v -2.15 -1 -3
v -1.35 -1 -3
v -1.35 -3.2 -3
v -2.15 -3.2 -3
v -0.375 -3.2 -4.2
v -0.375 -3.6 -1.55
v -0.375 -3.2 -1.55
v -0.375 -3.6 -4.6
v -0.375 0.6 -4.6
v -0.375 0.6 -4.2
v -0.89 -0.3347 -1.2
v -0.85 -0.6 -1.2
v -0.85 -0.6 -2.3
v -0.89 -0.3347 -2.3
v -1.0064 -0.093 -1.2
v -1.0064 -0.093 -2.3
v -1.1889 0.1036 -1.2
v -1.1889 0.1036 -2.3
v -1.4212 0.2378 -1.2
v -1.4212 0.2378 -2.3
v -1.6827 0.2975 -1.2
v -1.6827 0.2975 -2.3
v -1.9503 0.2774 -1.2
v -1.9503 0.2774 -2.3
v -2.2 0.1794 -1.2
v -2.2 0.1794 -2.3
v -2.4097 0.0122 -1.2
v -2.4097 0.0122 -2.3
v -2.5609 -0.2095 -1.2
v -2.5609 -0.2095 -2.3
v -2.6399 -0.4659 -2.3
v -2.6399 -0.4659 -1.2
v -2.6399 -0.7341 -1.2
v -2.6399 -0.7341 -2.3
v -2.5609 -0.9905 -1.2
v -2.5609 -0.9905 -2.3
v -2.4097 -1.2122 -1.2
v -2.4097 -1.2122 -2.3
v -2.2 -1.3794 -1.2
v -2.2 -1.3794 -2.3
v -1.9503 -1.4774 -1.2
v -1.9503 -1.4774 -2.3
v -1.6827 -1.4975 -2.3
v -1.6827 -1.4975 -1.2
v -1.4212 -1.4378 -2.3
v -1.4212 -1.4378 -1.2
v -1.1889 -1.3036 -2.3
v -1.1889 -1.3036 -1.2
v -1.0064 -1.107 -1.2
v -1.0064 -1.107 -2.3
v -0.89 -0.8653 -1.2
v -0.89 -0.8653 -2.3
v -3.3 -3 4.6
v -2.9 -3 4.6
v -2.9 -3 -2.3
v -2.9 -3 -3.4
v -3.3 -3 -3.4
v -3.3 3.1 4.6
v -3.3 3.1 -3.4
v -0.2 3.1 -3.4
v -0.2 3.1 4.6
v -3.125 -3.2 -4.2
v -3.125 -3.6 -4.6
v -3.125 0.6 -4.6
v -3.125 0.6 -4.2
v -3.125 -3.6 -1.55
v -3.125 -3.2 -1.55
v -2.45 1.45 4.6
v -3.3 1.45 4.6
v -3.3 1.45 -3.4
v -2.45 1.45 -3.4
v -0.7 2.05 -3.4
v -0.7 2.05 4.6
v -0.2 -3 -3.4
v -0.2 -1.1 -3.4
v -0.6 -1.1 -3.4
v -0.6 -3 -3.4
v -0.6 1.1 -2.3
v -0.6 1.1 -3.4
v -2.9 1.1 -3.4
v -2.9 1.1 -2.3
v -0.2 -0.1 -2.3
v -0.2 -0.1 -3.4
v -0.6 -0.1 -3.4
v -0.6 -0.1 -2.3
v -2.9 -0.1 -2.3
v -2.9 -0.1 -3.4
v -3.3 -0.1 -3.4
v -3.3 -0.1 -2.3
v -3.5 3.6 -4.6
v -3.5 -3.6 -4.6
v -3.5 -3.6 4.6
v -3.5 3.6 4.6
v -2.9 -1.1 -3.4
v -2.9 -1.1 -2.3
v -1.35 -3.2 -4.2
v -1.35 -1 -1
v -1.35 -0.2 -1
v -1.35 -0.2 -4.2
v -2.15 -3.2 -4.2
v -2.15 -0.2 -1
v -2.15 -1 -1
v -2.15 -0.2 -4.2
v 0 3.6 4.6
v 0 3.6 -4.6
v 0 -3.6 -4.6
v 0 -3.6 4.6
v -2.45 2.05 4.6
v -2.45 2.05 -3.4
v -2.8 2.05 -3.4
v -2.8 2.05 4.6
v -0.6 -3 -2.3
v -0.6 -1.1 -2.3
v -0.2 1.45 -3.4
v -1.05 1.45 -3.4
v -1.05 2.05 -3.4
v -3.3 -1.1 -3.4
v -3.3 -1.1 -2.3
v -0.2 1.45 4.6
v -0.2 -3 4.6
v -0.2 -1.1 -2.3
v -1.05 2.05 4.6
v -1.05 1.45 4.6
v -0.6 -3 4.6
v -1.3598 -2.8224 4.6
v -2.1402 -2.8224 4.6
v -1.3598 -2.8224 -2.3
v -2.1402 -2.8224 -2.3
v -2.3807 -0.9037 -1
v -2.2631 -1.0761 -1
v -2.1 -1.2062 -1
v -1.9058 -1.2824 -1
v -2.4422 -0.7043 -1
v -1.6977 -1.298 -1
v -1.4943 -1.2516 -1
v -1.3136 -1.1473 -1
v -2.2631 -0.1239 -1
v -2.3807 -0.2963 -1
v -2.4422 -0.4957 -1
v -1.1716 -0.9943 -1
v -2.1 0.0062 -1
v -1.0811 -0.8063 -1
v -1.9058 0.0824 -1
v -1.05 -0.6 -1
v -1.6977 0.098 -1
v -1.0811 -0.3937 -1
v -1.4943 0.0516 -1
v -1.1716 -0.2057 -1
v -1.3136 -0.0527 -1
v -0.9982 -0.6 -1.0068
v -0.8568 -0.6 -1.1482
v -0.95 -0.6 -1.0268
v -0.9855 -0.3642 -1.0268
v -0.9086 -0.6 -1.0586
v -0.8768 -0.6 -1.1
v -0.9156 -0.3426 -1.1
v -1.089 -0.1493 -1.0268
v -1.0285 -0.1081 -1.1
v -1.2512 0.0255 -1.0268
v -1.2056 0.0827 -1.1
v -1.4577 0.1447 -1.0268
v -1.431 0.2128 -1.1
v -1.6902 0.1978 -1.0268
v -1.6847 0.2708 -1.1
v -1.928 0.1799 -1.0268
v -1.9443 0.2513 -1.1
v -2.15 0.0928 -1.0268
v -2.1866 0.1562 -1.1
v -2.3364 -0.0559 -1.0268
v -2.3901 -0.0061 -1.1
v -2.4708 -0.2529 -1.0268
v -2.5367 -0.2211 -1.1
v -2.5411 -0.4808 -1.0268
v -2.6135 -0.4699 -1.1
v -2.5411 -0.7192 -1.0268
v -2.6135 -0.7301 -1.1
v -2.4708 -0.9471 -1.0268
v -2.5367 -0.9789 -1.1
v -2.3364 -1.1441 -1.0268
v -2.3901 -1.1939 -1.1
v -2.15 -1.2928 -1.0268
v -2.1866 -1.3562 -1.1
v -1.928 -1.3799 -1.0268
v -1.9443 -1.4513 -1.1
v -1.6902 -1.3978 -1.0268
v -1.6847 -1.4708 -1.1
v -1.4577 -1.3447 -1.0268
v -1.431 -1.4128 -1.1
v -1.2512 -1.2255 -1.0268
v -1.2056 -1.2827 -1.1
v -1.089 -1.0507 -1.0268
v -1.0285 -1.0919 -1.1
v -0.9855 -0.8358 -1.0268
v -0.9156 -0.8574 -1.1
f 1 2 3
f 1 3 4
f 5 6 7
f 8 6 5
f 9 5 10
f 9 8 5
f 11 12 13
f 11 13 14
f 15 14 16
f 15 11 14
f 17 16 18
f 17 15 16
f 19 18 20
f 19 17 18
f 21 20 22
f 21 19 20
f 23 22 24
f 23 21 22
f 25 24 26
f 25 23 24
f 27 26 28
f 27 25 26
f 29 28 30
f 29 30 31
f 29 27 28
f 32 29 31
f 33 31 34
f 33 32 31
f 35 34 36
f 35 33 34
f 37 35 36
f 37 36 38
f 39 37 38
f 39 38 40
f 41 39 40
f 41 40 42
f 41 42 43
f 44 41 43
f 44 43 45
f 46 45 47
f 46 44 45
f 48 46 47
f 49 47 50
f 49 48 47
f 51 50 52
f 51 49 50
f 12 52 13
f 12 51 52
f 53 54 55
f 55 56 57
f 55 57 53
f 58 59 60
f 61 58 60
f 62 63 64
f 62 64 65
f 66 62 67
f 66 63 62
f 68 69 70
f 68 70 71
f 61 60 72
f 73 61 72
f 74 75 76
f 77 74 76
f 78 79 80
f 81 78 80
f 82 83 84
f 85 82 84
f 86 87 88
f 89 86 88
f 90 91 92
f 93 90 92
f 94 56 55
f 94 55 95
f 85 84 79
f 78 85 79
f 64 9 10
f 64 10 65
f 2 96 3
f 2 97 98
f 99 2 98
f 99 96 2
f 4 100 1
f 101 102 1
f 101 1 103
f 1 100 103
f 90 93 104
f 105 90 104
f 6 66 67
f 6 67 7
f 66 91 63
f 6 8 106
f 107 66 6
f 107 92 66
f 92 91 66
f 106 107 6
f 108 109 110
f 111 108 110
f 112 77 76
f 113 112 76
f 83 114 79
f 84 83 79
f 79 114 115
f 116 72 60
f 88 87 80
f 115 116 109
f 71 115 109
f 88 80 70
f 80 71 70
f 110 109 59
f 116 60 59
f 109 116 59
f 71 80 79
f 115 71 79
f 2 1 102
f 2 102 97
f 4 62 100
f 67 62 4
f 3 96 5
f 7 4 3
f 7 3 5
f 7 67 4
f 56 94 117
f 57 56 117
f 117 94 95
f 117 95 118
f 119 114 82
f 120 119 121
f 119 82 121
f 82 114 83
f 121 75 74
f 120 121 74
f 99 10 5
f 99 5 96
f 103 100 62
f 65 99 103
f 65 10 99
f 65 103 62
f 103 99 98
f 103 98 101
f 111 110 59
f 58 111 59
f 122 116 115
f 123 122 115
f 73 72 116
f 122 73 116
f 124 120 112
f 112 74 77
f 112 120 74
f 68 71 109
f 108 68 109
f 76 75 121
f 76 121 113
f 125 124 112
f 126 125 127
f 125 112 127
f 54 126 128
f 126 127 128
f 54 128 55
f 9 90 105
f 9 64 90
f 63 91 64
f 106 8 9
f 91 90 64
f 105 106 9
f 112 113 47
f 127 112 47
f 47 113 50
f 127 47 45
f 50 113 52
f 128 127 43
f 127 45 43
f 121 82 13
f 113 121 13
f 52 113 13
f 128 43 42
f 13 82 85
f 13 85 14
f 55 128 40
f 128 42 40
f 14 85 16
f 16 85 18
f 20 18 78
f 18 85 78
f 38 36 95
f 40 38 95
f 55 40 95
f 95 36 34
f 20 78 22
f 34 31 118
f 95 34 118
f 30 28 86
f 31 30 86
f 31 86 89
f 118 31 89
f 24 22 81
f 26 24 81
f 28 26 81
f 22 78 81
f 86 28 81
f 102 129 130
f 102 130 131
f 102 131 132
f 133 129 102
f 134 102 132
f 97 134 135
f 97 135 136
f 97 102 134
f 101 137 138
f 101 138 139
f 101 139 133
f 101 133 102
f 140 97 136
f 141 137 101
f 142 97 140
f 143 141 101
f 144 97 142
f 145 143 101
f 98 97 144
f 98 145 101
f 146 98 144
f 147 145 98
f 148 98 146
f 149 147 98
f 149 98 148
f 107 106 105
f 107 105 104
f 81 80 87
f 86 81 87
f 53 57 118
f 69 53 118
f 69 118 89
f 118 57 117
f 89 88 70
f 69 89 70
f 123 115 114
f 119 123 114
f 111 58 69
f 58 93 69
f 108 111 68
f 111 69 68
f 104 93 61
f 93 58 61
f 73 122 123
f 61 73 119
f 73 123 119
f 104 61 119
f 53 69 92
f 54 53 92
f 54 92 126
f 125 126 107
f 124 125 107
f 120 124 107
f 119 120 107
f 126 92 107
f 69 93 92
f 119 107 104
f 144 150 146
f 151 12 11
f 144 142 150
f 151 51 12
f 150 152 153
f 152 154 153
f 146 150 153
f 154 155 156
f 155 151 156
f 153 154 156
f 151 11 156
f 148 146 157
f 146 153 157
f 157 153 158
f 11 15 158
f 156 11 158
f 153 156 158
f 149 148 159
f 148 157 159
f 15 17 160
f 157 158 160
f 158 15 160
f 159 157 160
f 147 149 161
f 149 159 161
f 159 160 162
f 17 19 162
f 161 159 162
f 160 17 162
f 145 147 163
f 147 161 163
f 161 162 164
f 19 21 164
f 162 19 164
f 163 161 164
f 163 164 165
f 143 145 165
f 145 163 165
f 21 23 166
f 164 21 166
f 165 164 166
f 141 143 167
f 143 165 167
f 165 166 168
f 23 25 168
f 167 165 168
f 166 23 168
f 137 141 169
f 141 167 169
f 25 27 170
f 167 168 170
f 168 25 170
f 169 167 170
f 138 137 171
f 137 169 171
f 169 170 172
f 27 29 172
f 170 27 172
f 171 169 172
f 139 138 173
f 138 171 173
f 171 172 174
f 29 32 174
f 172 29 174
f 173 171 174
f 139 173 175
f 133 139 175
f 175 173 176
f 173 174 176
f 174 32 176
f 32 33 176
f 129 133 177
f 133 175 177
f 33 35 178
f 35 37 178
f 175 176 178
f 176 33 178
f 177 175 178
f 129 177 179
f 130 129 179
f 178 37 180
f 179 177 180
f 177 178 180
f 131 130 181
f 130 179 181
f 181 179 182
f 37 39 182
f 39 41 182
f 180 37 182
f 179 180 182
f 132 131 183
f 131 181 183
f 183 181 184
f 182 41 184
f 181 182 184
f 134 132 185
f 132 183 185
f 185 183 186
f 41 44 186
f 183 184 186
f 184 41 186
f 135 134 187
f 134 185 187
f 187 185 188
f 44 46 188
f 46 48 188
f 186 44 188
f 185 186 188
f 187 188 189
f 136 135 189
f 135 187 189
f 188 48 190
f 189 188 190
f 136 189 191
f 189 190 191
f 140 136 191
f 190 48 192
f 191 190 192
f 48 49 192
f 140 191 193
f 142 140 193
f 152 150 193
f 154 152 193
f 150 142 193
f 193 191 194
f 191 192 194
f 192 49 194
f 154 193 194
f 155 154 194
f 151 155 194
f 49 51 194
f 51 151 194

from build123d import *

# Parameters (mm, degrees)
SKETCH_1_W           = 3.5
SKETCH_1_H           = 9.2
EXTRUDE_1_DEPTH      = 7.2
SKETCH_2_W           = 2.75
SKETCH_2_H           = 3.05
CUT_EXTRUDE_1_DEPTH  = 0.4
SKETCH_5_W           = 2.75
SKETCH_5_H           = 3.8
CUT_EXTRUDE_4_DEPTH  = 0.4
CUT_EXTRUDE_6_REACH  = 10.533
SKETCH_9_R           = 0.9
EXTRUDE_3_DEPTH      = 1.3
SKETCH_10_W          = 0.8
SKETCH_10_H          = 3
CUT_EXTRUDE_7_DEPTH  = 1.2
SKETCH_11_W          = 0.8
SKETCH_11_H          = 2
CUT_EXTRUDE_8_DEPTH  = 0.8
FILLET_2_R           = 0.2
CUT_EXTRUDE_12_REACH = 11.445
DRAFT_3_ANGLE        = -25.463345062
DRAFT_4_ANGLE        = -25.463345062
CUT_EXTRUDE_15_REACH = 11.445
SKETCH_18_W          = 0.4
SKETCH_18_H          = 1.9
CUT_EXTRUDE_16_REACH = 11.445
SKETCH_19_W          = 0.4
SKETCH_19_H          = 1.9


with BuildPart() as part:
    # Эскиз1 → Бобышка-Вытянуть1 (new body)
    with BuildSketch(Plane.XZ.offset(3.6)):
        with Locations((-1.75, 0)):
            Rectangle(SKETCH_1_W, SKETCH_1_H)
    extrude(amount=-EXTRUDE_1_DEPTH)

    # Эскиз2 → Вырез-Вытянуть1 (cut)
    with BuildSketch(Plane.XZ.offset(3.6)):
        with Locations((-1.75, -3.075)):
            Rectangle(SKETCH_2_W, SKETCH_2_H)
    extrude(amount=-CUT_EXTRUDE_1_DEPTH, mode=Mode.SUBTRACT)

    # Эскиз5 → Вырез-Вытянуть4 (cut)
    with BuildSketch(Plane(origin=(0, 0, -4.6), x_dir=(-1, 0, 0), z_dir=(0, 0, -1))):
        with Locations((1.75, -1.3)):
            Rectangle(SKETCH_5_W, SKETCH_5_H)
    extrude(amount=-CUT_EXTRUDE_4_DEPTH, mode=Mode.SUBTRACT)

    # Эскиз7 → Вырез-Вытянуть6 (cut, up to next)
    with BuildSketch(Plane(origin=(0, 0, -2.3), x_dir=(-1, 0, 0), z_dir=(0, 0, -1)), mode=Mode.PRIVATE) as cut_extrude_6_sk1:
        with BuildLine():
            Line((3.3, -1.1), (3.3, -0.1))
            Line((3.3, -0.1), (2.9, -0.1))
            Line((2.9, -0.1), (2.9, 1.1))
            Line((2.9, 1.1), (0.6, 1.1))
            Line((0.6, 1.1), (0.6, -0.1))
            Line((0.6, -0.1), (0.2, -0.1))
            Line((0.2, -0.1), (0.2, -1.1))
            Line((0.2, -1.1), (0.6, -1.1))
            Line((0.6, -1.1), (0.6, -3))
            ThreePointArc((0.6, -3), (1.75, -2.8), (2.9, -3))
            Line((2.9, -3), (2.9, -1.1))
            Line((2.9, -1.1), (3.3, -1.1))
        make_face()
    cut_extrude_6_tool1 = extrude(cut_extrude_6_sk1.sketch, amount=-CUT_EXTRUDE_6_REACH, mode=Mode.PRIVATE) & part.part
    add(cut_extrude_6_tool1.solids().sort_by_distance((-1.75, -0.860527, -2.3))[0], mode=Mode.SUBTRACT)

    # Эскиз9 → Бобышка-Вытянуть3 (add)
    with BuildSketch(Plane.XY.offset(-1)):
        with Locations((-1.75, -0.6)):
            Circle(SKETCH_9_R)
    extrude(amount=-EXTRUDE_3_DEPTH)

    # Эскиз10 → Вырез-Вытянуть7 (cut)
    with BuildSketch(Plane(origin=(0, 0, -4.2), x_dir=(-1, 0, 0), z_dir=(0, 0, -1))):
        with Locations((1.75, -1.7)):
            Rectangle(SKETCH_10_W, SKETCH_10_H)
    extrude(amount=-CUT_EXTRUDE_7_DEPTH, mode=Mode.SUBTRACT)

    # Эскиз11 → Вырез-Вытянуть8 (cut)
    with BuildSketch(Plane(origin=(0, -0.2, 0), x_dir=(1, 0, 0), z_dir=(0, 1, 0))):
        with Locations((-1.75, 2)):
            Rectangle(SKETCH_11_W, SKETCH_11_H)
    extrude(amount=-CUT_EXTRUDE_8_DEPTH, mode=Mode.SUBTRACT)

    # Скругление2
    fillet_2_edges = [part.edges().sort_by_distance(p)[0] for p in [
        (-2.65, -0.6, -1),
    ]]
    fillet(fillet_2_edges, radius=FILLET_2_R)

    # Эскиз15 → Вырез-Вытянуть12 (cut, up to next)
    with BuildSketch(Plane(origin=(0, 0, -3.4), x_dir=(-1, 0, 0), z_dir=(0, 0, -1)), mode=Mode.PRIVATE) as cut_extrude_12_sk1:
        Polygon((1.05, 2.05), (1.05, 1.45), (0.2, 1.45), (0.2, -0.1), (0.6, -0.1), (0.6, 1.1), (2.9, 1.1), (2.9, -0.1), (3.3, -0.1), (3.3, 1.45), (2.45, 1.45), (2.45, 2.05), (3.3, 2.05), (3.3, 3.1), (0.2, 3.1), (0.2, 2.05), align=None)
    cut_extrude_12_tool1 = extrude(cut_extrude_12_sk1.sketch, amount=-CUT_EXTRUDE_12_REACH, mode=Mode.PRIVATE) & part.part
    add(cut_extrude_12_tool1.solids().sort_by_distance((-1.75, 1.90798, -3.4))[0], mode=Mode.SUBTRACT)

    # Уклон3
    draft_3_faces = [part.faces().sort_by_distance(p)[0] for p in [
        (-0.2, 2.575, 0.6),
    ]]
    draft(draft_3_faces, Plane(origin=(-3.3, 3.1, 4.601), x_dir=(0, 0, -1), z_dir=(0, -1, 0)), DRAFT_3_ANGLE)

    # Уклон4
    draft_4_faces = [part.faces().sort_by_distance(p)[0] for p in [
        (-3.3, 2.575, 0.6),
    ]]
    draft(draft_4_faces, Plane(origin=(-3.3, 3.1, 4.601), x_dir=(0, 0, -1), z_dir=(0, -1, 0)), DRAFT_4_ANGLE)

    # Эскиз18 → Вырез-Вытянуть15 (cut, up to next)
    with BuildSketch(Plane(origin=(0, 0, -3.4), x_dir=(-1, 0, 0), z_dir=(0, 0, -1)), mode=Mode.PRIVATE) as cut_extrude_15_sk1:
        with Locations((0.4, -2.05)):
            Rectangle(SKETCH_18_W, SKETCH_18_H)
    cut_extrude_15_tool1 = extrude(cut_extrude_15_sk1.sketch, amount=-CUT_EXTRUDE_15_REACH, mode=Mode.PRIVATE) & part.part
    add(cut_extrude_15_tool1.solids().sort_by_distance((-0.4, -2.05, -3.4))[0], mode=Mode.SUBTRACT)

    # Эскиз19 → Вырез-Вытянуть16 (cut, up to next)
    with BuildSketch(Plane(origin=(0, 0, -3.4), x_dir=(-1, 0, 0), z_dir=(0, 0, -1)), mode=Mode.PRIVATE) as cut_extrude_16_sk1:
        with Locations((3.1, -2.05)):
            Rectangle(SKETCH_19_W, SKETCH_19_H)
    cut_extrude_16_tool1 = extrude(cut_extrude_16_sk1.sketch, amount=-CUT_EXTRUDE_16_REACH, mode=Mode.PRIVATE) & part.part
    add(cut_extrude_16_tool1.solids().sort_by_distance((-3.1, -2.05, -3.4))[0], mode=Mode.SUBTRACT)


solid = part.part
